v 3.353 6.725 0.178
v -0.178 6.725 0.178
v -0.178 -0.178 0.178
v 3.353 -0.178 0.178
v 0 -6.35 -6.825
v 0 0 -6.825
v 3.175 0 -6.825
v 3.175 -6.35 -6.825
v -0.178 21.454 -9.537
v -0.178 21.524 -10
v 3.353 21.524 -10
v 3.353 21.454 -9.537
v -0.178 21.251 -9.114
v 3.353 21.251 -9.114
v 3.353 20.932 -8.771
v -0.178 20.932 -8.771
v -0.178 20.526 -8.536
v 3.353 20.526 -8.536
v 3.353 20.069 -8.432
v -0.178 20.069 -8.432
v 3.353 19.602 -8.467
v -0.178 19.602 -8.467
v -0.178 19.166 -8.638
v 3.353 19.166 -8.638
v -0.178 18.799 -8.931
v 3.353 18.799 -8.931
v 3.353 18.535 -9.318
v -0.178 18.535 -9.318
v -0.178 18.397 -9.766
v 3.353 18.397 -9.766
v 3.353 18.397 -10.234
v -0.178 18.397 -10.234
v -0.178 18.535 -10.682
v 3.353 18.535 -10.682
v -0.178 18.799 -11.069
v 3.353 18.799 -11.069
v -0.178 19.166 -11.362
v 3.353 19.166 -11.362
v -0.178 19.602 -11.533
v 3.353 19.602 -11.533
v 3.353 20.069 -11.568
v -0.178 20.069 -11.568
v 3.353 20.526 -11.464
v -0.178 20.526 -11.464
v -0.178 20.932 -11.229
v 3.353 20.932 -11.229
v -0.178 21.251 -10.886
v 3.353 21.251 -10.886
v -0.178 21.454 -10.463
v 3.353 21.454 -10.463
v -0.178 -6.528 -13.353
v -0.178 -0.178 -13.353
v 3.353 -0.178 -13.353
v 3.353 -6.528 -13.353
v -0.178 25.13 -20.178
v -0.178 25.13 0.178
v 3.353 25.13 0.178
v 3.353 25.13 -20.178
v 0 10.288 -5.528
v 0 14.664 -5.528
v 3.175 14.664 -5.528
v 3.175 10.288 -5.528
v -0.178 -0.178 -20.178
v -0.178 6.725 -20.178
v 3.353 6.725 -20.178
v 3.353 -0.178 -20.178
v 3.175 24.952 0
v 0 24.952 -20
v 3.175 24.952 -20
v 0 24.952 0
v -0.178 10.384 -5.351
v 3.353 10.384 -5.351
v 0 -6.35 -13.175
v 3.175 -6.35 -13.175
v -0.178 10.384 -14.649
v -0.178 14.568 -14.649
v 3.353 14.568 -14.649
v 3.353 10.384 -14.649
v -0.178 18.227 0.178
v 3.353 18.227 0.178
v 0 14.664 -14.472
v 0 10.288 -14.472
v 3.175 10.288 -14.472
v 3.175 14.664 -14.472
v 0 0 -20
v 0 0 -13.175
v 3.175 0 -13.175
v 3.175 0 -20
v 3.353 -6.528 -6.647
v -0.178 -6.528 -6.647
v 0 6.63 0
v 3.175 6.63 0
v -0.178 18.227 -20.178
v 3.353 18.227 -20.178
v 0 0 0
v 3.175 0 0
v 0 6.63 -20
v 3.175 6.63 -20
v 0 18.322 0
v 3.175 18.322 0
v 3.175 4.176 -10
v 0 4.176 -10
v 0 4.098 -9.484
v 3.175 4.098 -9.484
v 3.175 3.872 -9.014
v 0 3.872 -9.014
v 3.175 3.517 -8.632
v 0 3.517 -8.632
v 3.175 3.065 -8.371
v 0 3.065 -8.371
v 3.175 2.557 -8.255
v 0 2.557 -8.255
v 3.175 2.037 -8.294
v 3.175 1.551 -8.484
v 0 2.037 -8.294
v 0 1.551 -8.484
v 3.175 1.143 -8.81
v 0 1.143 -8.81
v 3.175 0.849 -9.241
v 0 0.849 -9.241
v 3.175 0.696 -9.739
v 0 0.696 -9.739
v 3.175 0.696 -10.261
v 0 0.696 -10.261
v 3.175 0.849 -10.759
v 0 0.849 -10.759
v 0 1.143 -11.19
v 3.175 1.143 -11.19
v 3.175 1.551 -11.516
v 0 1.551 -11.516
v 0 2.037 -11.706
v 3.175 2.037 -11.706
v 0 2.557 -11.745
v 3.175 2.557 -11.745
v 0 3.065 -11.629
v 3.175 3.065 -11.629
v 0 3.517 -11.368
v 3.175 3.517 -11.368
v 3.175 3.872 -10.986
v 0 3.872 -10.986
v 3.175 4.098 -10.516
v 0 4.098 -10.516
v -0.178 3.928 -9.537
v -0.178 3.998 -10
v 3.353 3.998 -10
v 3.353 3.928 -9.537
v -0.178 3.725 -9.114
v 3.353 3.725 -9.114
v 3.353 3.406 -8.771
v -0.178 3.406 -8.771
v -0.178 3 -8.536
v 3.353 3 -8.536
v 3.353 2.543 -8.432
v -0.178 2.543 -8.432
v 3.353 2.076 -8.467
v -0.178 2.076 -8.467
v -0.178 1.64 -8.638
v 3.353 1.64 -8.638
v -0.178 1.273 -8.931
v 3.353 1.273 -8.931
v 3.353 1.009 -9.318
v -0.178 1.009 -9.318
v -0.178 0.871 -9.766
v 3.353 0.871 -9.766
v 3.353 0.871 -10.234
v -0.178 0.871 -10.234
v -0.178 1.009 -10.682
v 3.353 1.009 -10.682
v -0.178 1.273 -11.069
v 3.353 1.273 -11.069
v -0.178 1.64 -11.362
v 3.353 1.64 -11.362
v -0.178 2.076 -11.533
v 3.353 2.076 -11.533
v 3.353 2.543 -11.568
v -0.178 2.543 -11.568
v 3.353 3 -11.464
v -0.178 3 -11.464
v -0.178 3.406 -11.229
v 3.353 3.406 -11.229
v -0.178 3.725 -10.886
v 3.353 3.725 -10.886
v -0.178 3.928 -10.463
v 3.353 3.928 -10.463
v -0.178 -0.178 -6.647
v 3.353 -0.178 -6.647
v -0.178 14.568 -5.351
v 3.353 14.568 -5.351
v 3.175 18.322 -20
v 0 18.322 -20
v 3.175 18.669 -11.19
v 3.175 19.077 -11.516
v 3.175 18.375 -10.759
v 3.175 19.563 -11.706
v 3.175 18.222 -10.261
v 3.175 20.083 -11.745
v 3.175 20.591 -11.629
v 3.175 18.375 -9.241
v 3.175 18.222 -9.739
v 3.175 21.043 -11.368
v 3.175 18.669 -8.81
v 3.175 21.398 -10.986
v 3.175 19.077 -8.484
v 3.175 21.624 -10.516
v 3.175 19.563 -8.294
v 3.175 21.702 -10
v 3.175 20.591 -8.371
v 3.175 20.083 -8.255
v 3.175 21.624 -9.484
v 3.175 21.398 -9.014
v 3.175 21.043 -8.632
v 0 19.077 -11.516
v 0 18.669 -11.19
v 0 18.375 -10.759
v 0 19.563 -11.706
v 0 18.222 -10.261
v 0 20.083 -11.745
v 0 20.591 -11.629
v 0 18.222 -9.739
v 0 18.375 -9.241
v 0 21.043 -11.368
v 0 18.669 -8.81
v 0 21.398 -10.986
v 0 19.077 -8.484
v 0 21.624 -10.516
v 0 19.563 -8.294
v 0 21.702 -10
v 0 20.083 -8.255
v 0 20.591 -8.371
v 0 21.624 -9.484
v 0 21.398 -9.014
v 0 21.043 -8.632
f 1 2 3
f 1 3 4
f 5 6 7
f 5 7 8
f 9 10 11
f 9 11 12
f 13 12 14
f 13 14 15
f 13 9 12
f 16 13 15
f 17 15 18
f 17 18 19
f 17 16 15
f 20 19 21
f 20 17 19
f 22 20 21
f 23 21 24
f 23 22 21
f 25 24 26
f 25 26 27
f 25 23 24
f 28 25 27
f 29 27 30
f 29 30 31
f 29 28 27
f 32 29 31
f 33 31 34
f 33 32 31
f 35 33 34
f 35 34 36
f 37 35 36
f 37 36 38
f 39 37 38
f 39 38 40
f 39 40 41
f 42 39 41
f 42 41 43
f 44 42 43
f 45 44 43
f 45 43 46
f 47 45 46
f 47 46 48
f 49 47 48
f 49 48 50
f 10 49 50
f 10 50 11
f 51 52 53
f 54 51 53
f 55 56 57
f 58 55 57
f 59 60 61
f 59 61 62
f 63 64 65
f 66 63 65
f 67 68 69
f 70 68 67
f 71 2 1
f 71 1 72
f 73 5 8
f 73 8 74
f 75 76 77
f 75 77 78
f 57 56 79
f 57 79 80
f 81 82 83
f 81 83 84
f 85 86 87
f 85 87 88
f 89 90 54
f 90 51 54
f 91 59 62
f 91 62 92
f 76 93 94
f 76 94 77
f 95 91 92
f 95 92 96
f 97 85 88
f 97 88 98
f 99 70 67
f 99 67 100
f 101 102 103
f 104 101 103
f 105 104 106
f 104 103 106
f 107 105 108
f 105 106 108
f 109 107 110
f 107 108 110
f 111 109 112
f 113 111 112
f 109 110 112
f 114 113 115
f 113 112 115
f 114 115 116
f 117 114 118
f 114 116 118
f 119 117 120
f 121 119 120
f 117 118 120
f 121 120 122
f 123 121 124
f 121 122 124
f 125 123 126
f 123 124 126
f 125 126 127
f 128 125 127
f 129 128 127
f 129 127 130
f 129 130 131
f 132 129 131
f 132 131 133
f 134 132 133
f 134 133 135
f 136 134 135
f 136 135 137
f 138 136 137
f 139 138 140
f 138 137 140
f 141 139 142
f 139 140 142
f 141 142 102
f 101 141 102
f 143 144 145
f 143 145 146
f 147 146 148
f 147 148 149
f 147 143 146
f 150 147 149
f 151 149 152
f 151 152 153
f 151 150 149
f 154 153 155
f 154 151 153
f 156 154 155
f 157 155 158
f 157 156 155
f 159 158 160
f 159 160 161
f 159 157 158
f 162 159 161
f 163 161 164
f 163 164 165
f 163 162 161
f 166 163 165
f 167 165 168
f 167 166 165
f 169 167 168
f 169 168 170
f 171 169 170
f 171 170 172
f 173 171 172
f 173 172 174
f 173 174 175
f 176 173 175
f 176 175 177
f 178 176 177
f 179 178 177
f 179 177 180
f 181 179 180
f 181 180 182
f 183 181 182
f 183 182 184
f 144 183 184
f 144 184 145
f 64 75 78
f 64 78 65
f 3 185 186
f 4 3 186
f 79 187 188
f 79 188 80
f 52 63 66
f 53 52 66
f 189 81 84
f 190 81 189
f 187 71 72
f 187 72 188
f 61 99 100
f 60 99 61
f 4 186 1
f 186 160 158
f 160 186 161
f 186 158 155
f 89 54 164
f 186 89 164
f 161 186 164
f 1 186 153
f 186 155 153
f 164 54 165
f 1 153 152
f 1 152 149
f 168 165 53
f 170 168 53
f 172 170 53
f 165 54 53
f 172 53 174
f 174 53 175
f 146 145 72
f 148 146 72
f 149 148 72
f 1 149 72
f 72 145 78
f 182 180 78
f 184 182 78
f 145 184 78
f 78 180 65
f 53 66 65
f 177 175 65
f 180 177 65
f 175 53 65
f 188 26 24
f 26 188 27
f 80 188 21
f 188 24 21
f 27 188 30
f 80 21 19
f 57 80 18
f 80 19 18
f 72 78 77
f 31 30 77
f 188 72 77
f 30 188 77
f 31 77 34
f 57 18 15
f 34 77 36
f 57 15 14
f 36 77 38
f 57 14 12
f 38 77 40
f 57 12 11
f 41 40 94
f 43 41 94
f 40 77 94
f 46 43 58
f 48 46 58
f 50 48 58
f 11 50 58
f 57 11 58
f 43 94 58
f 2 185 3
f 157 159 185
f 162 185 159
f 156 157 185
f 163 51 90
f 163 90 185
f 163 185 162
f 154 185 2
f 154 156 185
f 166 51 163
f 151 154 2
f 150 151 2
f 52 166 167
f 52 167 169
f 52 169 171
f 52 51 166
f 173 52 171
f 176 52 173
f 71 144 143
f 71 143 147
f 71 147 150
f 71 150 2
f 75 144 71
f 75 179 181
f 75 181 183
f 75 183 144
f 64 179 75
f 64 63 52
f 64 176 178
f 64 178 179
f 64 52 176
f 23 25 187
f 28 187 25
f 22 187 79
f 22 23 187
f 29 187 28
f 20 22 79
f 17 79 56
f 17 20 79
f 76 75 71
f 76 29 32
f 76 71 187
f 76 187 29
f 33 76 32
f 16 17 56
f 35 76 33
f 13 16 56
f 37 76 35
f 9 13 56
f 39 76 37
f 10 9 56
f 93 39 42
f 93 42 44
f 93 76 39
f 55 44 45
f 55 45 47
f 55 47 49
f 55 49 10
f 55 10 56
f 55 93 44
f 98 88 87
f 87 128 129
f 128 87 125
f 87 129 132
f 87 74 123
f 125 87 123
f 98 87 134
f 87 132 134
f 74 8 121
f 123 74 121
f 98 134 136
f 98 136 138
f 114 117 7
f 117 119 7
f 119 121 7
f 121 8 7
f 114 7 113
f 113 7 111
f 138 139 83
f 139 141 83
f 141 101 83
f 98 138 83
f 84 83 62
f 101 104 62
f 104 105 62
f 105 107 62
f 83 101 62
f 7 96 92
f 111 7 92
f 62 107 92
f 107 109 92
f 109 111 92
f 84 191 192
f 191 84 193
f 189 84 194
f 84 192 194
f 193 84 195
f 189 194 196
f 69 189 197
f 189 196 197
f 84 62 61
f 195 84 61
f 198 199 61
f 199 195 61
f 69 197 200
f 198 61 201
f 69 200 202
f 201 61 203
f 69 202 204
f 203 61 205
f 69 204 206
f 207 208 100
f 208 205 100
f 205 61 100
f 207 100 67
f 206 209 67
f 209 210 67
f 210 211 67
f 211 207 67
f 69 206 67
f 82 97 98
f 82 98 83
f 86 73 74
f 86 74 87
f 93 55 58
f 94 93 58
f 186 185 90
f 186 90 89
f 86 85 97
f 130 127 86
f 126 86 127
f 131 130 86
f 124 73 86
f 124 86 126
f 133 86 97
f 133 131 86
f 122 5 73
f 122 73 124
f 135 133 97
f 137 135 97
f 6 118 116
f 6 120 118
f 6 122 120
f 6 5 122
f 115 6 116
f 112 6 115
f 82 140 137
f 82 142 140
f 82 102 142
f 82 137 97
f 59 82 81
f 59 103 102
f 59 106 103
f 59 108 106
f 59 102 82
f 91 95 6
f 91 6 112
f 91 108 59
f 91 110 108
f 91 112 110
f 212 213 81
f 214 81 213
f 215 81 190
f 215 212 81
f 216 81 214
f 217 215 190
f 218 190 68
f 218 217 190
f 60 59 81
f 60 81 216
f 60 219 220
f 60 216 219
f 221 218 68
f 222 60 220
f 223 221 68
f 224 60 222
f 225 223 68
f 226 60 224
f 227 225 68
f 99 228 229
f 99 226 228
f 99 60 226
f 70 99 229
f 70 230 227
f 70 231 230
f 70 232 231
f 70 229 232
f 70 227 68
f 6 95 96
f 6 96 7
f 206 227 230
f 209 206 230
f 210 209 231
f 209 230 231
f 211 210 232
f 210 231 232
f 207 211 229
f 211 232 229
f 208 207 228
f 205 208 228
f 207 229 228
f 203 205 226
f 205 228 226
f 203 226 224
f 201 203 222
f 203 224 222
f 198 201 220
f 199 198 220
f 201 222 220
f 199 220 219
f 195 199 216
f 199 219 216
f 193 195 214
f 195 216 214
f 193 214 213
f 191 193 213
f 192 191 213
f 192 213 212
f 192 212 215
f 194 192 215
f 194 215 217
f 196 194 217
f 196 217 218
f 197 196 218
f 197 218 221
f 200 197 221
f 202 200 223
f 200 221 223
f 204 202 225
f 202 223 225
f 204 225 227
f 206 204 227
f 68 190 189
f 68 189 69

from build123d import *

# Parameters (mm, degrees)
SKETCH1_R            = 1.75
BOSS_EXTRUDE1_DEPTH  = 3.175
SHELL1_START         = -13.3528
SHELL1_OUTLINE_W     = 3.5306
SHELL1_OUTLINE_H     = 6.35
SHELL1_DEPTH         = 0.1778
SHELL1_START_2       = -6.825
SHELL1_2_OUTLINE_W   = 3.5306
SHELL1_2_OUTLINE_H   = 6.35
SHELL1_2_DEPTH       = 0.1778
SHELL1_START_3       = -20.1778
SHELL1_3_OUTLINE_W   = 3.5306
SHELL1_3_OUTLINE_H   = 25.3075948
SHELL1_3_DEPTH       = 20.3556
SHELL1_START_4       = -13.175
SHELL1_4_OUTLINE_W   = 3.5306
SHELL1_4_OUTLINE_H   = 6.35
SHELL1_4_DEPTH       = 6.35
SHELL1_5_OUTLINE_R   = 1.75
SHELL1_5_OUTLINE_R_2 = 1.5722
SHELL1_5_DEPTH       = 3.175
SHELL1_START_5       = -0.1778
SHELL1_6_OUTLINE_R   = 1.5722
SHELL1_6_DEPTH       = 3.5306


with BuildPart() as part:
    # Sketch1 → Boss-Extrude1 (new body)
    with BuildSketch(Plane(origin=(0, 0, 0), x_dir=(0, 0, -1), z_dir=(1, 0, 0))):
        Polygon((0, 0), (6.825, 0), (6.825, -6.35), (13.175, -6.35), (13.175, 0), (20, 0), (20, 6.629574014), (14.471500996, 10.288392178), (14.471500996, 14.663602622), (20, 18.322420786), (20, 24.9519948), (0, 24.9519948), (0, 18.322420786), (5.528499004, 14.663602622), (5.528499004, 10.288392178), (0, 6.629574014), align=None)
        with Locations((10, 19.9519948)):
            Circle(SKETCH1_R, mode=Mode.SUBTRACT)
        with Locations((10, 2.4259948)):
            Circle(SKETCH1_R, mode=Mode.SUBTRACT)
    extrude(amount=BOSS_EXTRUDE1_DEPTH)

    # Shell1: read off the stored shape, not the designer's step
    # Shell1 outline → Shell1 (add)
    with BuildSketch(Plane.XY.offset(SHELL1_START)):
        with Locations((1.5875, -3.3528)):
            Rectangle(SHELL1_OUTLINE_W, SHELL1_OUTLINE_H)
    extrude(amount=SHELL1_DEPTH)

    # Shell1 2 outline → Shell1 2 (add)
    with BuildSketch(Plane.XY.offset(SHELL1_START_2)):
        with Locations((1.5875, -3.3528)):
            Rectangle(SHELL1_2_OUTLINE_W, SHELL1_2_OUTLINE_H)
    extrude(amount=SHELL1_2_DEPTH)

    # Shell1 3 outline → Shell1 3 (add)
    with BuildSketch(Plane.XY.offset(SHELL1_START_3)):
        with Locations((1.5875, 12.4759974)):
            Rectangle(SHELL1_3_OUTLINE_W, SHELL1_3_OUTLINE_H)
    extrude(amount=SHELL1_3_DEPTH)

    # Shell1 4 outline → Shell1 4 (add)
    with BuildSketch(Plane.XY.offset(SHELL1_START_4)):
        with Locations((1.5875, -3.3528)):
            Rectangle(SHELL1_4_OUTLINE_W, SHELL1_4_OUTLINE_H)
    extrude(amount=SHELL1_4_DEPTH)

    # Shell1 5 outline → Shell1 5 (cut)
    # profile 1 of 5: a face of its own
    with BuildSketch(Plane.YZ):
        Polygon((14.568061248, -14.649300996), (10.383933552, -14.649300996), (6.725115387, -20.1778), (18.226879413, -20.1778), align=None)
    # profile 2 of 5: a face of its own
    with BuildSketch(Plane.YZ):
        Polygon((10.383933552, -5.350699004), (14.568061248, -5.350699004), (18.226879413, 0.1778), (6.725115387, 0.1778), align=None)
    # profile 3 of 5: a face of its own
    with BuildSketch(Plane.YZ):
        Polygon((6.629574014, 0), (0, 0), (0, -6.825), (-6.35, -6.825), (-6.35, -13.175), (0, -13.175), (0, -20), (6.629574014, -20), (10.288392178, -14.471500996), (14.663602622, -14.471500996), (18.322420786, -20), (24.9519948, -20), (24.9519948, 0), (18.322420786, 0), (14.663602622, -5.528499004), (10.288392178, -5.528499004), align=None)
        with Locations((2.4259948, -10)):
            Circle(SHELL1_5_OUTLINE_R, mode=Mode.SUBTRACT)
        with Locations((19.9519948, -10)):
            Circle(SHELL1_5_OUTLINE_R, mode=Mode.SUBTRACT)
    # profile 4 of 5: a face of its own
    with BuildSketch(Plane.YZ):
        with Locations((2.4259948, -10)):
            Circle(SHELL1_5_OUTLINE_R_2)
    # profile 5 of 5: a face of its own
    with BuildSketch(Plane.YZ):
        with Locations((19.9519948, -10)):
            Circle(SHELL1_5_OUTLINE_R_2)
    extrude(amount=SHELL1_5_DEPTH, mode=Mode.SUBTRACT)

    # Shell1 6 outline → Shell1 6 (cut)
    with BuildSketch(Plane.YZ.offset(SHELL1_START_5)):
        Polygon((14.568061248, -14.649300996), (10.383933552, -14.649300996), (6.725115387, -20.1778), (18.226879413, -20.1778), align=None)
        Polygon((10.383933552, -5.350699004), (14.568061248, -5.350699004), (18.226879413, 0.1778), (6.725115387, 0.1778), align=None)
        with Locations((19.9519948, -10)):
            Circle(SHELL1_6_OUTLINE_R)
        with Locations((2.4259948, -10)):
            Circle(SHELL1_6_OUTLINE_R)
    extrude(amount=SHELL1_6_DEPTH, mode=Mode.SUBTRACT)


solid = part.part
